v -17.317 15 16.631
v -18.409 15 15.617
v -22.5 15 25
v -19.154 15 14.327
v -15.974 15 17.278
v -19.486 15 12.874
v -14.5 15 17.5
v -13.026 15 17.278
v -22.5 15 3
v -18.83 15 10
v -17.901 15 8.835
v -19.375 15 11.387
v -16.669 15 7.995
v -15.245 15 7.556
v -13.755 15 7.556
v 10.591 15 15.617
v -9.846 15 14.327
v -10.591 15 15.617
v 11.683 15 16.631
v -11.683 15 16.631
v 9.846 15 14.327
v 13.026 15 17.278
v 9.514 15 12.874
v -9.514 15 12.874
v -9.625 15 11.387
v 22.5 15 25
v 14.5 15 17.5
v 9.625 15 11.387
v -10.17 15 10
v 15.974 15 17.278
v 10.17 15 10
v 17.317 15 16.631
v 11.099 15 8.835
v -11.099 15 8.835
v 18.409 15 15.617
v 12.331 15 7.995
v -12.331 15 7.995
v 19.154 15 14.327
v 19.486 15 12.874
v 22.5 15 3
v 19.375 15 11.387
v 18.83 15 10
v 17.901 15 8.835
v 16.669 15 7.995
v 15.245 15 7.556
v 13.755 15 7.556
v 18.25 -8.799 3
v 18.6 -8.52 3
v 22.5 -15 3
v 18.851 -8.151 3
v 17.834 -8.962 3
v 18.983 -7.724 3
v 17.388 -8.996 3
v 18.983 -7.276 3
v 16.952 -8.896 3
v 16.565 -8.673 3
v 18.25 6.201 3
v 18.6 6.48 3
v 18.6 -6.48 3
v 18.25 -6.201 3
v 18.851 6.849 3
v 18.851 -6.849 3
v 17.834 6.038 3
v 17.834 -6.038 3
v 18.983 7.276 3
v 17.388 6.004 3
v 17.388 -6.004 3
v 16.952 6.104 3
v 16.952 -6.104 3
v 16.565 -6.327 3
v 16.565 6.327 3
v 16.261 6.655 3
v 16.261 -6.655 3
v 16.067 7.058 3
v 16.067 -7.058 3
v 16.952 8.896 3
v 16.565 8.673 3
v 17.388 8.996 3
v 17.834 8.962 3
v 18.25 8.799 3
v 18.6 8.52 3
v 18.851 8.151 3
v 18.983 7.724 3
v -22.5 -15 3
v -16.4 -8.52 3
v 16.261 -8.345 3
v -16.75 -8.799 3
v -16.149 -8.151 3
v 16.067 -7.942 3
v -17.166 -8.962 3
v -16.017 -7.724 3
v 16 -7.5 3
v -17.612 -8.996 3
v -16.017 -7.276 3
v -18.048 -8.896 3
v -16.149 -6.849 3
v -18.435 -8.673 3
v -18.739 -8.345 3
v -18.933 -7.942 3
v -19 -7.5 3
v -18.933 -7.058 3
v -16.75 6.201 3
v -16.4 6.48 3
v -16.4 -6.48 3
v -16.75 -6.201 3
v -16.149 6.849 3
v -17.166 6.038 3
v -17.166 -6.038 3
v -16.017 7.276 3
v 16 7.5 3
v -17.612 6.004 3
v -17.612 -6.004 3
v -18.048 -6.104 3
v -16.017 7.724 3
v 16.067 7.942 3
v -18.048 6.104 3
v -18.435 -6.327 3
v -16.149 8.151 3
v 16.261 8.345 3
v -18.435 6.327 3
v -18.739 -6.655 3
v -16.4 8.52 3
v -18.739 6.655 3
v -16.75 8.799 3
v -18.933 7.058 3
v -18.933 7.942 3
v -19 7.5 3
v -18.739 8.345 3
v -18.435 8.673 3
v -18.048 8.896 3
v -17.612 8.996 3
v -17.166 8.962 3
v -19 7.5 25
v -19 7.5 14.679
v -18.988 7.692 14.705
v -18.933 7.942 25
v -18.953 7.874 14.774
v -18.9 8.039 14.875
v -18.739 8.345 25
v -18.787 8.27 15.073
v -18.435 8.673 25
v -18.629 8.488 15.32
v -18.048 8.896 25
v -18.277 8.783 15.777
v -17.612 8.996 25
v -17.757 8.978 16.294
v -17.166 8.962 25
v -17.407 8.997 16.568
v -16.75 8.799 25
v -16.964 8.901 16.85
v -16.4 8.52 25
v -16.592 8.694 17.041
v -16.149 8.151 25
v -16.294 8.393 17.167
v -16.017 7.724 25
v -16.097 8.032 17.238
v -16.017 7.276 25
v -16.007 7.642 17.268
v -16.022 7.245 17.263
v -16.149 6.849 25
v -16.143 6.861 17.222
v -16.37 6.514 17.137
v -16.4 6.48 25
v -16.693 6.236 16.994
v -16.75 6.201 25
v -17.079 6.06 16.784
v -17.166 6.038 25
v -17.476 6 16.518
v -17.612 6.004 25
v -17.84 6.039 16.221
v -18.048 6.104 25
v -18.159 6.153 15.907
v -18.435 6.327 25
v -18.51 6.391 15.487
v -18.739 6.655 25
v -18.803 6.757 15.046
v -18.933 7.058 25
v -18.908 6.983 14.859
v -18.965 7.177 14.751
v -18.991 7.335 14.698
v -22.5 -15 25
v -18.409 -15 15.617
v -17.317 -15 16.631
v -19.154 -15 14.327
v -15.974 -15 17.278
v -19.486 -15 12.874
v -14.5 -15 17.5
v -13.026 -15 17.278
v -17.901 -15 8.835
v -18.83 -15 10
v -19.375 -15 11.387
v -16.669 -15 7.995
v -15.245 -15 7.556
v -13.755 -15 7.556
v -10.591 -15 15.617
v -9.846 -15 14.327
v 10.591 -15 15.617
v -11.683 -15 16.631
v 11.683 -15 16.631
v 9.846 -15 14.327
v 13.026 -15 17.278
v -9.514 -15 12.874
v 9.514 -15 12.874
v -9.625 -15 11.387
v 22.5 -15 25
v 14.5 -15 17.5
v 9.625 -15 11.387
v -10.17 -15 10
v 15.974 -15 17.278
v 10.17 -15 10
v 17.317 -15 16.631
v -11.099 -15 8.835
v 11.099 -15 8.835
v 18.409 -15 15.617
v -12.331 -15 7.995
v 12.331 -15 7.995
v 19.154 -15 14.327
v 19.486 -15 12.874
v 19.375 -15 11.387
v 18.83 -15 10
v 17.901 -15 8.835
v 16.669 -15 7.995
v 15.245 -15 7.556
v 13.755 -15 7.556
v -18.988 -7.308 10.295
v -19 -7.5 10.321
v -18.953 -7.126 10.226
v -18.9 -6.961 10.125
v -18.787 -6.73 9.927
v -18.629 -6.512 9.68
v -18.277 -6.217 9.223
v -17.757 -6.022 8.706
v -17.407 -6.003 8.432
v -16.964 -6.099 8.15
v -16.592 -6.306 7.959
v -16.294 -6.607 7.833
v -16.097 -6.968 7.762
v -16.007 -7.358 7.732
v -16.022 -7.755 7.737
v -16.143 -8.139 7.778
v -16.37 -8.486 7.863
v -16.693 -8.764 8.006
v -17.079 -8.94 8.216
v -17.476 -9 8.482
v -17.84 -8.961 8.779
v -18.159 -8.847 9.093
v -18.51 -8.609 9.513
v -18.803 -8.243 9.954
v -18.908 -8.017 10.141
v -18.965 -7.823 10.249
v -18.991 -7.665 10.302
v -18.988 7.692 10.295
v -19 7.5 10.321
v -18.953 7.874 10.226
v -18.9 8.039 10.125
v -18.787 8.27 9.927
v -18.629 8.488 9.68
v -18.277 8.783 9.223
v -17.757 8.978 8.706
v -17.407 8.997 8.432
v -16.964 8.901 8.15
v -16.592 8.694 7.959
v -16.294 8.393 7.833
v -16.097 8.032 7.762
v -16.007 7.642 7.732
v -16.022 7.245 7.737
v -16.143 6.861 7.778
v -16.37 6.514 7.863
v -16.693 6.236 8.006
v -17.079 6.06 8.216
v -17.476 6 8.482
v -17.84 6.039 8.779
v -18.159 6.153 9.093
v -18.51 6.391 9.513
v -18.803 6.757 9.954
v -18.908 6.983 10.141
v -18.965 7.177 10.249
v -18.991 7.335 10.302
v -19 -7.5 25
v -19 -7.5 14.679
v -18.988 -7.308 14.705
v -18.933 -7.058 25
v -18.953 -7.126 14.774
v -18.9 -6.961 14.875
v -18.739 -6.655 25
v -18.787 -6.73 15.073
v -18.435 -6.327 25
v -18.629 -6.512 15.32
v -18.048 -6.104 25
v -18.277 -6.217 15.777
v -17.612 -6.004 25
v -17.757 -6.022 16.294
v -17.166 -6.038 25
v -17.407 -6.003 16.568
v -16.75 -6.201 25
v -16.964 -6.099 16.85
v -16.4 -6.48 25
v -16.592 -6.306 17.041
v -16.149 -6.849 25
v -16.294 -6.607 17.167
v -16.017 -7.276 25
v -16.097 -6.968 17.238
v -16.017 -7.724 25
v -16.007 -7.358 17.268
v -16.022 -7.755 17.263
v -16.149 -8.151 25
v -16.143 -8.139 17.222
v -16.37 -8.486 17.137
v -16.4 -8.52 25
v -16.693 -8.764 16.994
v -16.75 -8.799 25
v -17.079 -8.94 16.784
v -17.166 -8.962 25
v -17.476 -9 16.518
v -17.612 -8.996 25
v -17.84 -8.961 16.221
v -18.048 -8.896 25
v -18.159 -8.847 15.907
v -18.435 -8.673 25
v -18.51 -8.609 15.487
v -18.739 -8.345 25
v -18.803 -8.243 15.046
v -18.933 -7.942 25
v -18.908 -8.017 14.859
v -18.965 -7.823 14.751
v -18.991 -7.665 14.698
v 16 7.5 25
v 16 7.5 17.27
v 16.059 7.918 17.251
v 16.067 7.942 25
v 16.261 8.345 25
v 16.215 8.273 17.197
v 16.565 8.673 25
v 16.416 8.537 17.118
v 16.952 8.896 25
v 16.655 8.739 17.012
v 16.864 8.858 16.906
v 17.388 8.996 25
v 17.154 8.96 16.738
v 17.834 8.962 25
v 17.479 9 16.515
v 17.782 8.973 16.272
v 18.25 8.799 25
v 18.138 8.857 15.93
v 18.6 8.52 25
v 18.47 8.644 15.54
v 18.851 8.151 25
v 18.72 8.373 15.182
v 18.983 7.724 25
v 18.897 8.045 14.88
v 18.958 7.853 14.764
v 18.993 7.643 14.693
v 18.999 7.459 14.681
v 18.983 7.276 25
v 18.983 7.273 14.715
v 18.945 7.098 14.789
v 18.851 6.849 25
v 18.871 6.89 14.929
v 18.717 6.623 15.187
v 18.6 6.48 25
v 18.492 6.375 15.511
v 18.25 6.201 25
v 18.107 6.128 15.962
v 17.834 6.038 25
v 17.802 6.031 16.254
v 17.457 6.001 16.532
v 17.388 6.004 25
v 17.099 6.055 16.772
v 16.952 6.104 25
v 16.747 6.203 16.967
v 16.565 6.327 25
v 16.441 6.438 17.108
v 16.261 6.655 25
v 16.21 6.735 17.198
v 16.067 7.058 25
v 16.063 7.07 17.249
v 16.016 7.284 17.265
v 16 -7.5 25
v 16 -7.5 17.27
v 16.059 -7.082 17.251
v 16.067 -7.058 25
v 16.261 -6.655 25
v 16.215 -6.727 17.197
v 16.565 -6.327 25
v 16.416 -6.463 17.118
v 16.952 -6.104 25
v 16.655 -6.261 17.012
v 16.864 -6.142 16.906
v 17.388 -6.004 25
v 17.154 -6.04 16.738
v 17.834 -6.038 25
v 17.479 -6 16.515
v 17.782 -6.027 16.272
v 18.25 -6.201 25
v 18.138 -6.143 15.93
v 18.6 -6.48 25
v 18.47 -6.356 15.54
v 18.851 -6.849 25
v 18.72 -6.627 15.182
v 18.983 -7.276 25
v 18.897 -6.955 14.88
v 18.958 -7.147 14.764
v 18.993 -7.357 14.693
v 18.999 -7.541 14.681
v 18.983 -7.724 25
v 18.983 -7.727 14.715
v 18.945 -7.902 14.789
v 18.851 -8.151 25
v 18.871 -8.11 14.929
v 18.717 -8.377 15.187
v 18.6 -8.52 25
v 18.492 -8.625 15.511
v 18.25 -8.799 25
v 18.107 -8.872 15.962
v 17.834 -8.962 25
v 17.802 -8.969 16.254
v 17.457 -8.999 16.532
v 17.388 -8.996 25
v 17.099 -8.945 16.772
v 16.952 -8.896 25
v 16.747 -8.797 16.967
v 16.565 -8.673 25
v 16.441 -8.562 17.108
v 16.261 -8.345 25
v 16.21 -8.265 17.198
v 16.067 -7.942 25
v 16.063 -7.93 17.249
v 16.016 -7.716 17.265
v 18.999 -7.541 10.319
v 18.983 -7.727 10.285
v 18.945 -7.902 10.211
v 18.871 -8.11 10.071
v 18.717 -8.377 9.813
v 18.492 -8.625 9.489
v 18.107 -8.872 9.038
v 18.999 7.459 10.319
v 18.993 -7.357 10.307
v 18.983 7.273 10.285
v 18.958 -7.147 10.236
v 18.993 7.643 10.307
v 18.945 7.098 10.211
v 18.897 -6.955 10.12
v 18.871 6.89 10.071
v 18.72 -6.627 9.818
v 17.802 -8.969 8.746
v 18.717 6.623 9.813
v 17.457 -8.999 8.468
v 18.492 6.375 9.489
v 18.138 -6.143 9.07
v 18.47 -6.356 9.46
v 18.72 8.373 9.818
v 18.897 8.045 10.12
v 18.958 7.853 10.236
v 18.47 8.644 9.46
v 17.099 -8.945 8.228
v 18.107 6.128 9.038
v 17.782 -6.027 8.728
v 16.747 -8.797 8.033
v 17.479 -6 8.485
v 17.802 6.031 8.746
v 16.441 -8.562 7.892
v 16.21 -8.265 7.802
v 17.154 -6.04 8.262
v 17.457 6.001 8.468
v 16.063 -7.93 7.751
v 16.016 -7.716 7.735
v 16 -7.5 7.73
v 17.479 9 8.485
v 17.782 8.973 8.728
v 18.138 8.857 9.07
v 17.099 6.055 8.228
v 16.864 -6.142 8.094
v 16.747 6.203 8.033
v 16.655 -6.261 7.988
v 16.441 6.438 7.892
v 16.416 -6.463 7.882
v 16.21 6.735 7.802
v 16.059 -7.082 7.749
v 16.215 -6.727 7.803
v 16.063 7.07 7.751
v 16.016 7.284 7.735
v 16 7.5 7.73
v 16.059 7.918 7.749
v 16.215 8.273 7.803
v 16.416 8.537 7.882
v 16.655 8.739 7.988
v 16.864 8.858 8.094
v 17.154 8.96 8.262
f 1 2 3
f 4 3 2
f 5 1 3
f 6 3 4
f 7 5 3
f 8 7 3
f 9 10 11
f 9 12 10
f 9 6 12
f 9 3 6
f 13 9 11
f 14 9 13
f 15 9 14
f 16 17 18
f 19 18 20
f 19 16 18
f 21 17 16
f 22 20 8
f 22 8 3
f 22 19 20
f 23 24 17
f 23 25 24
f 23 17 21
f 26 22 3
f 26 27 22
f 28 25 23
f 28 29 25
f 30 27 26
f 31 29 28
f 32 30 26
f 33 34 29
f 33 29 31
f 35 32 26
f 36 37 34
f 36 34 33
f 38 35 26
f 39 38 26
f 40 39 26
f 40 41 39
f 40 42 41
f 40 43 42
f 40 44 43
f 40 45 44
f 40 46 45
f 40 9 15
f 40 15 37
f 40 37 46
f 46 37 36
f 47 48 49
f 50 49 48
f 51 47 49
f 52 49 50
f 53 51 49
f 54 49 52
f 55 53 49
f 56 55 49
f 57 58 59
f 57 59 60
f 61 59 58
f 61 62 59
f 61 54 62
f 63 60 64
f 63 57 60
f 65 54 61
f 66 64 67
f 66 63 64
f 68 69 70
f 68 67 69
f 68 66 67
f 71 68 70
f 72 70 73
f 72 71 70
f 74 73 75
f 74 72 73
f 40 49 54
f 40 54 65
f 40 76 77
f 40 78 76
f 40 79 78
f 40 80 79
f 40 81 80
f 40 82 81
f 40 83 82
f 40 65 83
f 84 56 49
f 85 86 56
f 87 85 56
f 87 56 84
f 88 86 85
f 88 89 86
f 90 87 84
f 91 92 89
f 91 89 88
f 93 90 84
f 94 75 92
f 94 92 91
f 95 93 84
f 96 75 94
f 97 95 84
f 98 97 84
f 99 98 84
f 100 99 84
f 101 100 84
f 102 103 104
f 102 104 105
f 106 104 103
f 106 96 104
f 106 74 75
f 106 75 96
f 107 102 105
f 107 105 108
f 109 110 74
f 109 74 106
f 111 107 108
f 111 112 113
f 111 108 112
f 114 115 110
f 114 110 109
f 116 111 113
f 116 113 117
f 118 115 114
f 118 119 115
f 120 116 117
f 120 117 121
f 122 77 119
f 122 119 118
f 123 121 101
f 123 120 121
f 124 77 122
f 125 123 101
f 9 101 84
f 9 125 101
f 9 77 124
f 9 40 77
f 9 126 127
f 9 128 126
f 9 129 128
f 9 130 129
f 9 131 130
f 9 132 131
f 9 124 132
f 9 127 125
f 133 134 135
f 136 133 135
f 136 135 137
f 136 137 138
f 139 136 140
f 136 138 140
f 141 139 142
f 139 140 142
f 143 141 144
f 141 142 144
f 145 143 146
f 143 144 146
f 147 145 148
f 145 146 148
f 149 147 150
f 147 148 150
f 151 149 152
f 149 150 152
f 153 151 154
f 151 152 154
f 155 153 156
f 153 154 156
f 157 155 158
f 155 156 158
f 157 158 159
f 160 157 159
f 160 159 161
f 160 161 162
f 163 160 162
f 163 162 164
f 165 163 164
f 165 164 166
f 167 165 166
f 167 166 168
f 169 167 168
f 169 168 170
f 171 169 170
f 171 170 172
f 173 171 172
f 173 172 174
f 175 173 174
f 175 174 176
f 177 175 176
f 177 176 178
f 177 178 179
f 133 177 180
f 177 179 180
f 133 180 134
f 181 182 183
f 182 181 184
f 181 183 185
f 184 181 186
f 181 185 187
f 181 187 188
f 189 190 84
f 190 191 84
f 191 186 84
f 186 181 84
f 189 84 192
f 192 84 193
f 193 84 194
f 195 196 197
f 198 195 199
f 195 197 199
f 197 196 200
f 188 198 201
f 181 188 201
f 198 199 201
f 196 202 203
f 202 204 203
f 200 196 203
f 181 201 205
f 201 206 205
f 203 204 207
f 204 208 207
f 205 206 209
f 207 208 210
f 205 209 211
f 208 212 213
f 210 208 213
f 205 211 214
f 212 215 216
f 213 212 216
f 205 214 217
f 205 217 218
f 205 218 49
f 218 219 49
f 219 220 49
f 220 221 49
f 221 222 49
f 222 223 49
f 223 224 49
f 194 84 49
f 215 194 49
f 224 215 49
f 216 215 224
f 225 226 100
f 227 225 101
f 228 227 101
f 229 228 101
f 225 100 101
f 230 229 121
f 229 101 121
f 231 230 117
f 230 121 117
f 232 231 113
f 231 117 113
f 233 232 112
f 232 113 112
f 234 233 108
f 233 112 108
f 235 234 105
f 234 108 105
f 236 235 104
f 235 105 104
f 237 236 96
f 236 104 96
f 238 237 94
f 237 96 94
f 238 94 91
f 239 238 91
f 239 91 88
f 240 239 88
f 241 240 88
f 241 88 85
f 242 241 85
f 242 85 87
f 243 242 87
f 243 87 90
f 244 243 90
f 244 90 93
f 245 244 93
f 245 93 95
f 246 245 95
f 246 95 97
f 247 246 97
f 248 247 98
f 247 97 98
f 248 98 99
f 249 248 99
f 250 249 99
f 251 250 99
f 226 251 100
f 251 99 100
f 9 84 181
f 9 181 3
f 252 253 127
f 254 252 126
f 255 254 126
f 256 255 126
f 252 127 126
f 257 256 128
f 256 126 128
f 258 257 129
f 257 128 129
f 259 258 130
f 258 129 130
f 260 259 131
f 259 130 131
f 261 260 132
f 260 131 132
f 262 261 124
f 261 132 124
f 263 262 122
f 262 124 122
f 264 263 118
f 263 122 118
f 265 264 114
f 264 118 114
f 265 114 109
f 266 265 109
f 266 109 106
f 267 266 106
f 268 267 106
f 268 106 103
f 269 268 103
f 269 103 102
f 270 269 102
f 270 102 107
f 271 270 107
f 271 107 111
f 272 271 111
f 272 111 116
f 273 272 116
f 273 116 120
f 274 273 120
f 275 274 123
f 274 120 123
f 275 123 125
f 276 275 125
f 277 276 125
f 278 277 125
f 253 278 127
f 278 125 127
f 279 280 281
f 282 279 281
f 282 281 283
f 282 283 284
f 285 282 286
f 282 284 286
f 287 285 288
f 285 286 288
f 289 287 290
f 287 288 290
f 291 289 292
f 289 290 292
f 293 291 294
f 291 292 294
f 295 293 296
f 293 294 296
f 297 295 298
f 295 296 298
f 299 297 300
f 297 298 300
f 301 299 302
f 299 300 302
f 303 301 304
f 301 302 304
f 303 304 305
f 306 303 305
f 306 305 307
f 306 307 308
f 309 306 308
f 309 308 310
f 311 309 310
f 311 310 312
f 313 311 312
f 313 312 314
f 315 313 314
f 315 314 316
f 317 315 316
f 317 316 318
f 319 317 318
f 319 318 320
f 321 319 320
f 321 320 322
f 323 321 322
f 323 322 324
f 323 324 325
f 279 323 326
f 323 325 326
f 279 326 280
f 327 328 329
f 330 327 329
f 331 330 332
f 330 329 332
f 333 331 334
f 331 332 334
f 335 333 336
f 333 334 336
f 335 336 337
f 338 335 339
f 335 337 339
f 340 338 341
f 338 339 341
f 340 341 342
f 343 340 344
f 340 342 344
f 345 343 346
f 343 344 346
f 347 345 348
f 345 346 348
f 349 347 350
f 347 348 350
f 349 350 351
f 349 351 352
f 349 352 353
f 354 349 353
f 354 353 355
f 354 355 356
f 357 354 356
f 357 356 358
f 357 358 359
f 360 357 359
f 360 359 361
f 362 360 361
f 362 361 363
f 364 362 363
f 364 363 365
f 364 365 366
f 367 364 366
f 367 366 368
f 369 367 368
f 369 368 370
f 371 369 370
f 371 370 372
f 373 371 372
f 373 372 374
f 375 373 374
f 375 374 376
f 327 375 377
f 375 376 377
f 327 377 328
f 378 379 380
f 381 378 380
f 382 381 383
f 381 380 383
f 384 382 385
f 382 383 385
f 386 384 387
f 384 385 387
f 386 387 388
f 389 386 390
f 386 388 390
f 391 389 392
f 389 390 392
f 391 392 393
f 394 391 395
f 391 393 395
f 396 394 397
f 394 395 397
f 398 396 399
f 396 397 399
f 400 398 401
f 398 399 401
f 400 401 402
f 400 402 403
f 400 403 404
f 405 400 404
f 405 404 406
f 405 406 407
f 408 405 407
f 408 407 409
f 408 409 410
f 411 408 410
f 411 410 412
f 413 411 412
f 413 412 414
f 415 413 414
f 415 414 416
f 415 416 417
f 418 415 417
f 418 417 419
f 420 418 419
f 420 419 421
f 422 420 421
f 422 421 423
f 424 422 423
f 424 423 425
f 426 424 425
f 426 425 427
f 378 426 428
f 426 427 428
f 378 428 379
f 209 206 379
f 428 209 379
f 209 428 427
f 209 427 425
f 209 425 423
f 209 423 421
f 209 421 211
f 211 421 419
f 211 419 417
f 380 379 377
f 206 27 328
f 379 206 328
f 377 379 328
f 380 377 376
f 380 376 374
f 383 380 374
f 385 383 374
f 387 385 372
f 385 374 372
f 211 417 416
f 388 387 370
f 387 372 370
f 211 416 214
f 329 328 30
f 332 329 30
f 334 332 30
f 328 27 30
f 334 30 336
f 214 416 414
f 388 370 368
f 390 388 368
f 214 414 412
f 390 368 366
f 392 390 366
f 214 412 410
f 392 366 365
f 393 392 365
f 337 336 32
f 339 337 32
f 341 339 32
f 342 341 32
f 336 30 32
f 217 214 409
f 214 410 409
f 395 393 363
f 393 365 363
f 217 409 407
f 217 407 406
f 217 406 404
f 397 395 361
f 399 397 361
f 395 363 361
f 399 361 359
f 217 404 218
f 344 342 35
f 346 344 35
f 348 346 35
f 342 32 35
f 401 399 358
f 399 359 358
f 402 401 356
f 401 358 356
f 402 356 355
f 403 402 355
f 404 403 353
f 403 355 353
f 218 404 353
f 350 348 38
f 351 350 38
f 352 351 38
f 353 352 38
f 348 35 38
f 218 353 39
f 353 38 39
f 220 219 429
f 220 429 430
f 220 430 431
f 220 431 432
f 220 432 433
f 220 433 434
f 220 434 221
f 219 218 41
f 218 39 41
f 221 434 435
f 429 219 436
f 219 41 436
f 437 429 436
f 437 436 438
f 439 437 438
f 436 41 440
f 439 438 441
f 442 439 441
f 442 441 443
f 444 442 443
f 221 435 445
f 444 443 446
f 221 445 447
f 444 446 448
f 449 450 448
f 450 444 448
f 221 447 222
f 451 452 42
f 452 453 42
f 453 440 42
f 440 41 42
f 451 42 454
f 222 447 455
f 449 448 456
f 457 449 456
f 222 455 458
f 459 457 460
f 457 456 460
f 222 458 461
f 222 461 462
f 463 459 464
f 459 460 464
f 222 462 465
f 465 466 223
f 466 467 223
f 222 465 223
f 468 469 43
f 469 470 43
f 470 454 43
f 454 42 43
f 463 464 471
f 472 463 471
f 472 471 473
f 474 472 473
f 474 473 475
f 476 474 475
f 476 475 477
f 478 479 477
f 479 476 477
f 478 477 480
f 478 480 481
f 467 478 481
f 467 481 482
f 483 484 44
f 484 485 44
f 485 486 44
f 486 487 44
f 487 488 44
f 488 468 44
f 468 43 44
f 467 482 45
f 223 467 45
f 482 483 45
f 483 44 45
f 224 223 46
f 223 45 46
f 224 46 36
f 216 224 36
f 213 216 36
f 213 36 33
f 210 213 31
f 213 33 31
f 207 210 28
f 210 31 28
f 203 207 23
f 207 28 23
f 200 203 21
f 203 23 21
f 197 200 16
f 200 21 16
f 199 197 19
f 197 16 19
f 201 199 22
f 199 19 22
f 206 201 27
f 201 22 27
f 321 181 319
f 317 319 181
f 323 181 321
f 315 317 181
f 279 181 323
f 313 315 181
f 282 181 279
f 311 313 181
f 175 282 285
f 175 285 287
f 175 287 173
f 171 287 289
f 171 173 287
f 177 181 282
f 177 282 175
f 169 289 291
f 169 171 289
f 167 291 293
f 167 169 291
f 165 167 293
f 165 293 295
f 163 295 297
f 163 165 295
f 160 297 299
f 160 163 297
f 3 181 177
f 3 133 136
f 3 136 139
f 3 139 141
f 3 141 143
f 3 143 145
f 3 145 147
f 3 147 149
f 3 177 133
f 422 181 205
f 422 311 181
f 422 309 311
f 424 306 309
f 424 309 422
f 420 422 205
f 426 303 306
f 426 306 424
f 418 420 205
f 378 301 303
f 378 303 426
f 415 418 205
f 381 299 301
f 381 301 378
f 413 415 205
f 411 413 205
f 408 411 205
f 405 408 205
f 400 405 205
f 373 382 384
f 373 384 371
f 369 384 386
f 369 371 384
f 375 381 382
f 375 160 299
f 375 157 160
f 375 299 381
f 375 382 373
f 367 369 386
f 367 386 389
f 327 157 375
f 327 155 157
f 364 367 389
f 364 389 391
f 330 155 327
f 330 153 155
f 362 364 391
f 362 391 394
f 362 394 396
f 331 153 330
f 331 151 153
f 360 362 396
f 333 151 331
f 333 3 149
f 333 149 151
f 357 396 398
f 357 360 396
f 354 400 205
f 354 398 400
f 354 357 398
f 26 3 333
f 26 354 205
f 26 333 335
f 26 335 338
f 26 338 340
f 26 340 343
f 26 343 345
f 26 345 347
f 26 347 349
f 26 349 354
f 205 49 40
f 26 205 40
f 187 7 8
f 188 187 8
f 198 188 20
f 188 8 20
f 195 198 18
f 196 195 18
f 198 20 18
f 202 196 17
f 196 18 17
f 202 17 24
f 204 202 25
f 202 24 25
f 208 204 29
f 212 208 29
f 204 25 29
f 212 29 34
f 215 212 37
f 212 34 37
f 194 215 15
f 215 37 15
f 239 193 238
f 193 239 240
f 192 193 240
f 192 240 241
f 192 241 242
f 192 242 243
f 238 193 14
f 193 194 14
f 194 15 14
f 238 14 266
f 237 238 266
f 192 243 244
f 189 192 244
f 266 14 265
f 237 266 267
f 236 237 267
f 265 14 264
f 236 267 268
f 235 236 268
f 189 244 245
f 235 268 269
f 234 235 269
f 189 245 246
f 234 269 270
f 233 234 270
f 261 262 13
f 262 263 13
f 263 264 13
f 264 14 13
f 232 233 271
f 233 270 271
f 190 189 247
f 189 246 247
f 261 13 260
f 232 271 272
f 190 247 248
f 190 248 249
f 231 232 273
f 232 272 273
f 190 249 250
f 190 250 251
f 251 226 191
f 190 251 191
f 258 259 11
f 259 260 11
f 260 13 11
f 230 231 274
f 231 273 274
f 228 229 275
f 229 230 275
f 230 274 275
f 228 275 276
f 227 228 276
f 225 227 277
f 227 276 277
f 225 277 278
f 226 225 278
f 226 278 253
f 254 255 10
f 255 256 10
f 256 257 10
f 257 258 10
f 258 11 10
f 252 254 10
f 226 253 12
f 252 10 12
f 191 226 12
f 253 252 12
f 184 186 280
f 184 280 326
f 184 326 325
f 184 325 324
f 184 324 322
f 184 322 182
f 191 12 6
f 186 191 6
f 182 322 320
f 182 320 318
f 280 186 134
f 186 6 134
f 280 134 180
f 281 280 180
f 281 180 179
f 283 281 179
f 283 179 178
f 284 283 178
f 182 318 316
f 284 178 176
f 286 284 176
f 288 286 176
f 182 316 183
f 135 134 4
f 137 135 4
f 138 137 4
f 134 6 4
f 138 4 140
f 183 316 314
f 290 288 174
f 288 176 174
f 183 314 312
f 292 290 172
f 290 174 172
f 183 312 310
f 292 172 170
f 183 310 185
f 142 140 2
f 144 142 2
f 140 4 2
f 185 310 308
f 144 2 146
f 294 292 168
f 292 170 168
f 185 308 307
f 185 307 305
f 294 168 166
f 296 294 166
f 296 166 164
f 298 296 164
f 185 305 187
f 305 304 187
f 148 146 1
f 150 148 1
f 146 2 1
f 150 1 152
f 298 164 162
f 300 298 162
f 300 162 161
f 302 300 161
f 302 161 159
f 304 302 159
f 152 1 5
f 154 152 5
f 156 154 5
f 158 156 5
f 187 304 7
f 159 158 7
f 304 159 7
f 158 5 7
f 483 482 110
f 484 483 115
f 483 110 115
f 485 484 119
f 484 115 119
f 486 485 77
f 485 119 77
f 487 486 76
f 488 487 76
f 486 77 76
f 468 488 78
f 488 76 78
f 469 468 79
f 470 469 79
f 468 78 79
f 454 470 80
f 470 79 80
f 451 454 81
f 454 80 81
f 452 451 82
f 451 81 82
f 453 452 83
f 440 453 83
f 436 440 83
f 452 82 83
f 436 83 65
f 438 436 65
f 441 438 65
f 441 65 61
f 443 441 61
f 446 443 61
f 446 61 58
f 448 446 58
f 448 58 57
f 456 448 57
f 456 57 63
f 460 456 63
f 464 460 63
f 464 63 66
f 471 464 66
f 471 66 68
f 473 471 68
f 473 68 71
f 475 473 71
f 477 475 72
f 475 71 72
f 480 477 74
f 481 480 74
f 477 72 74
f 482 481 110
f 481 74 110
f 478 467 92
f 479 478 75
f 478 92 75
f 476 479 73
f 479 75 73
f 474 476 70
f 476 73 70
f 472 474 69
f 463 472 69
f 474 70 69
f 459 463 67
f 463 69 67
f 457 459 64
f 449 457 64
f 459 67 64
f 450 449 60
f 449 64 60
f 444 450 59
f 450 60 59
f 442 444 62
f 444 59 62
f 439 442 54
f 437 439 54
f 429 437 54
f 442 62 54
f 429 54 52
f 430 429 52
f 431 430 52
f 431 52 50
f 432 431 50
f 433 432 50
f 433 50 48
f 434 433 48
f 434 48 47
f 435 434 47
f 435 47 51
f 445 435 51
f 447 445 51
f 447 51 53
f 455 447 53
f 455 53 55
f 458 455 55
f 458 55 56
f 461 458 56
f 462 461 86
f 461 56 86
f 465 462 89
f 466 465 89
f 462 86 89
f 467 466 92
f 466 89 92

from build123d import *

# Parameters (mm, degrees)
SKETCH1_W           = 45
SKETCH1_H           = 30
BOSS_EXTRUDE2_DEPTH = 25
SKETCH4_R           = 1.5
CUT_EXTRUDE3_DEPTH  = 25
SKETCH5_R           = 5
CUT_EXTRUDE5_DEPTH  = 46.069390943
SKETCH7_W           = 45
SKETCH7_H           = 30
CUT_EXTRUDE8_DEPTH  = 3


with BuildPart() as part:
    # Sketch1 → Boss-Extrude2 (new body)
    with BuildSketch(Plane.XY):
        Rectangle(SKETCH1_W, SKETCH1_H)
    extrude(amount=BOSS_EXTRUDE2_DEPTH)

    # Sketch4 → Cut-Extrude3 (cut)
    with BuildSketch(Plane(origin=(0, 0, 0), x_dir=(-1, 0, 0), z_dir=(0, 0, -1))):
        with Locations((-17.5, 7.5)):
            Circle(SKETCH4_R)
        with Locations((17.5, 7.5)):
            Circle(SKETCH4_R)
        with Locations((-17.5, -7.5)):
            Circle(SKETCH4_R)
        with Locations((17.5, -7.5)):
            Circle(SKETCH4_R)
    extrude(amount=-CUT_EXTRUDE3_DEPTH, mode=Mode.SUBTRACT)

    # Sketch5 → Cut-Extrude5 (cut, through all)
    with BuildSketch(Plane(origin=(0, 15, 0), x_dir=(1, 0, 0), z_dir=(0, 1, 0))):
        with Locations(Location((-14.5, -12.5, 0), (0, 0, 270))):
            Circle(SKETCH5_R)
        with Locations(Location((14.5, -12.5, 0), (0, 0, 270))):
            Circle(SKETCH5_R)
    extrude(amount=-CUT_EXTRUDE5_DEPTH, mode=Mode.SUBTRACT)

    # Sketch7 → Cut-Extrude8 (cut)
    with BuildSketch(Plane(origin=(0, 0, 0), x_dir=(-1, 0, 0), z_dir=(0, 0, -1))):
        Rectangle(SKETCH7_W, SKETCH7_H)
    extrude(amount=-CUT_EXTRUDE8_DEPTH, mode=Mode.SUBTRACT)


solid = part.part
